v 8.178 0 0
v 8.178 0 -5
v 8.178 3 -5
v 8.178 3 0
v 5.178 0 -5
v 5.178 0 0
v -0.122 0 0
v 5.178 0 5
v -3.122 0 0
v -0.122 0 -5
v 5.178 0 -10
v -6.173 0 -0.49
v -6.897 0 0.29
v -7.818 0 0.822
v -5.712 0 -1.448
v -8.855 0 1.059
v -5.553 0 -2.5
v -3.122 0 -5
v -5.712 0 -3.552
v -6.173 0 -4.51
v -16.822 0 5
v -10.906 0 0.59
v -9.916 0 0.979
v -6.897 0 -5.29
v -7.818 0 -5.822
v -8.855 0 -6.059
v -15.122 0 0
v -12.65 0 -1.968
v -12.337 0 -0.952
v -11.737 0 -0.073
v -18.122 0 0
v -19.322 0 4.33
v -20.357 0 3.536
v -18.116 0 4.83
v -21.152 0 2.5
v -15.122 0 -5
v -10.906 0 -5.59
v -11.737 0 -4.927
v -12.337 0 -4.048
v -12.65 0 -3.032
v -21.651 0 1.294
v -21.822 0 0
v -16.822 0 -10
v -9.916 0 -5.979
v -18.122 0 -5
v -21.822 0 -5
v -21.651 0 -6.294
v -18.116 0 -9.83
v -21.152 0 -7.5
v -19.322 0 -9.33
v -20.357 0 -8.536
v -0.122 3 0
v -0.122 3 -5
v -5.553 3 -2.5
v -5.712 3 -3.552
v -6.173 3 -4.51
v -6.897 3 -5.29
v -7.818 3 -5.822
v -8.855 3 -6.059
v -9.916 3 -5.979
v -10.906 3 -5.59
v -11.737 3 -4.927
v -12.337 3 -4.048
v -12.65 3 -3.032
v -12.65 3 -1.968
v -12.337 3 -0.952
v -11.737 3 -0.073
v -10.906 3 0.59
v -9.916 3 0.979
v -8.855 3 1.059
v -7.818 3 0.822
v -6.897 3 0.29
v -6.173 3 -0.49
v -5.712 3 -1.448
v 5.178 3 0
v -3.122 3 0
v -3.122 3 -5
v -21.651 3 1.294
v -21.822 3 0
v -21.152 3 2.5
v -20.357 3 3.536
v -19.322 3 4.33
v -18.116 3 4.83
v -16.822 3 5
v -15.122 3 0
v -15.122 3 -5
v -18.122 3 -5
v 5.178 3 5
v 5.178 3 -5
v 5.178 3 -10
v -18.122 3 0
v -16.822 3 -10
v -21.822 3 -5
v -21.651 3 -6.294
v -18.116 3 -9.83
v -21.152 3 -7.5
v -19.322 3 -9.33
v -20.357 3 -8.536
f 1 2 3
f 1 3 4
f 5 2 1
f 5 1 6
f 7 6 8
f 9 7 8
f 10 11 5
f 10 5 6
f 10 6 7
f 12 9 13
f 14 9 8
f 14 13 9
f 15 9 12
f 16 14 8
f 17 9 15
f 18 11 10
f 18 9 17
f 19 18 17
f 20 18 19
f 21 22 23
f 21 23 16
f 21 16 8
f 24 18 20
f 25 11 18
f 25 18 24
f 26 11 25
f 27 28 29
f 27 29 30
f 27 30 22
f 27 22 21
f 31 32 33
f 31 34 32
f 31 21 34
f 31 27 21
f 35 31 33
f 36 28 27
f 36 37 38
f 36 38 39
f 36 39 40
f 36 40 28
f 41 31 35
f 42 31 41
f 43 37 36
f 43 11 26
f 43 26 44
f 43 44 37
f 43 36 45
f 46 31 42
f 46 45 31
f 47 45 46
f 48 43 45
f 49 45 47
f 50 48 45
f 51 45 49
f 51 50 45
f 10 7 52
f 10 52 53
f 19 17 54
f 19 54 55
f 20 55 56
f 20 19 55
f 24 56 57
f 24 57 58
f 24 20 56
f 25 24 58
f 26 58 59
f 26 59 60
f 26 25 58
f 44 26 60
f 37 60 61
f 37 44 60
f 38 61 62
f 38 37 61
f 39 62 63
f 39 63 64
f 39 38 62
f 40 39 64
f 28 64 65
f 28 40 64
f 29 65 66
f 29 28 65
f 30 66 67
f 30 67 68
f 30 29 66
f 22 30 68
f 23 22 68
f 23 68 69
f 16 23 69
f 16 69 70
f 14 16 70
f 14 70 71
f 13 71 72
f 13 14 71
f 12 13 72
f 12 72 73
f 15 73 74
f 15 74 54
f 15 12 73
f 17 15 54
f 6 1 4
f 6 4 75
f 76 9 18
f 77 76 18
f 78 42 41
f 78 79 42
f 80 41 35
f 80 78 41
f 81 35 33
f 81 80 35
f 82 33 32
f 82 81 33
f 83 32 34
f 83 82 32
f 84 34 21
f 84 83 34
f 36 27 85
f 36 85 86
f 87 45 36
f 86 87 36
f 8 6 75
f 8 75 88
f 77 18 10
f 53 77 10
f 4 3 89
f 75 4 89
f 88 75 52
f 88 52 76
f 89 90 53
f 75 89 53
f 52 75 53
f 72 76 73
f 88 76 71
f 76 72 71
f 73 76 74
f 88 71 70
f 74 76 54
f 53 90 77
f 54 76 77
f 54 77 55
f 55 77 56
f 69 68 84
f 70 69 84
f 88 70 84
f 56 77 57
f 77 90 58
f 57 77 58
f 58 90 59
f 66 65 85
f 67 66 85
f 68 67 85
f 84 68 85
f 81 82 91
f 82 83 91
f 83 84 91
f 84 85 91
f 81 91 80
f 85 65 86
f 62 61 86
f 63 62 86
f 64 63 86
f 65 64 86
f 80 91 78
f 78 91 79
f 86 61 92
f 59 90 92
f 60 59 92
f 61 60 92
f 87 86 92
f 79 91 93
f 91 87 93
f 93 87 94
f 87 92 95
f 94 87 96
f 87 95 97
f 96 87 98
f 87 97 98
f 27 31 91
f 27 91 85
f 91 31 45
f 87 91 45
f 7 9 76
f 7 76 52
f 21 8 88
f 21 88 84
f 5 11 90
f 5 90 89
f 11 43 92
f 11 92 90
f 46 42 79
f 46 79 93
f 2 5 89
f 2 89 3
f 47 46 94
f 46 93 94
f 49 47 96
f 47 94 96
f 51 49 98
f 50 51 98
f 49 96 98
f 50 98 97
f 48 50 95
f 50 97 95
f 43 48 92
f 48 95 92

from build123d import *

# Parameters (mm, degrees)
SKETCH1_R           = 3.5685
SKETCH1_W           = 3
SKETCH1_H           = 5
BOSS_EXTRUDE1_DEPTH = 3
FILLET1_R           = 5


with BuildPart() as part:
    # Sketch1 → Boss-Extrude1 (new body)
    with BuildSketch(Plane(origin=(0, 0, 0), x_dir=(1, 0, 0), z_dir=(0, 1, 0))):
        Polygon((-21.821592901, -5), (-21.821592901, 10), (5.178407099, 10), (5.178407099, 5), (8.178407099, 5), (8.178407099, 0), (5.178407099, 0), (5.178407099, -5), align=None)
        with Locations((-9.121592901, 2.5)):
            Circle(SKETCH1_R, mode=Mode.SUBTRACT)
        with Locations((-16.621592901, 2.5)):
            Rectangle(SKETCH1_W, SKETCH1_H, mode=Mode.SUBTRACT)
        with Locations((-1.621592901, 2.5)):
            Rectangle(SKETCH1_W, SKETCH1_H, mode=Mode.SUBTRACT)
    extrude(amount=BOSS_EXTRUDE1_DEPTH)

    # Fillet1
    fillet1_edges = [part.edges().sort_by_distance(p)[0] for p in [
        (-21.821592901, 1.5, 5),
        (-21.821592901, 1.5, -10),
    ]]
    fillet(fillet1_edges, radius=FILLET1_R)


solid = part.part
